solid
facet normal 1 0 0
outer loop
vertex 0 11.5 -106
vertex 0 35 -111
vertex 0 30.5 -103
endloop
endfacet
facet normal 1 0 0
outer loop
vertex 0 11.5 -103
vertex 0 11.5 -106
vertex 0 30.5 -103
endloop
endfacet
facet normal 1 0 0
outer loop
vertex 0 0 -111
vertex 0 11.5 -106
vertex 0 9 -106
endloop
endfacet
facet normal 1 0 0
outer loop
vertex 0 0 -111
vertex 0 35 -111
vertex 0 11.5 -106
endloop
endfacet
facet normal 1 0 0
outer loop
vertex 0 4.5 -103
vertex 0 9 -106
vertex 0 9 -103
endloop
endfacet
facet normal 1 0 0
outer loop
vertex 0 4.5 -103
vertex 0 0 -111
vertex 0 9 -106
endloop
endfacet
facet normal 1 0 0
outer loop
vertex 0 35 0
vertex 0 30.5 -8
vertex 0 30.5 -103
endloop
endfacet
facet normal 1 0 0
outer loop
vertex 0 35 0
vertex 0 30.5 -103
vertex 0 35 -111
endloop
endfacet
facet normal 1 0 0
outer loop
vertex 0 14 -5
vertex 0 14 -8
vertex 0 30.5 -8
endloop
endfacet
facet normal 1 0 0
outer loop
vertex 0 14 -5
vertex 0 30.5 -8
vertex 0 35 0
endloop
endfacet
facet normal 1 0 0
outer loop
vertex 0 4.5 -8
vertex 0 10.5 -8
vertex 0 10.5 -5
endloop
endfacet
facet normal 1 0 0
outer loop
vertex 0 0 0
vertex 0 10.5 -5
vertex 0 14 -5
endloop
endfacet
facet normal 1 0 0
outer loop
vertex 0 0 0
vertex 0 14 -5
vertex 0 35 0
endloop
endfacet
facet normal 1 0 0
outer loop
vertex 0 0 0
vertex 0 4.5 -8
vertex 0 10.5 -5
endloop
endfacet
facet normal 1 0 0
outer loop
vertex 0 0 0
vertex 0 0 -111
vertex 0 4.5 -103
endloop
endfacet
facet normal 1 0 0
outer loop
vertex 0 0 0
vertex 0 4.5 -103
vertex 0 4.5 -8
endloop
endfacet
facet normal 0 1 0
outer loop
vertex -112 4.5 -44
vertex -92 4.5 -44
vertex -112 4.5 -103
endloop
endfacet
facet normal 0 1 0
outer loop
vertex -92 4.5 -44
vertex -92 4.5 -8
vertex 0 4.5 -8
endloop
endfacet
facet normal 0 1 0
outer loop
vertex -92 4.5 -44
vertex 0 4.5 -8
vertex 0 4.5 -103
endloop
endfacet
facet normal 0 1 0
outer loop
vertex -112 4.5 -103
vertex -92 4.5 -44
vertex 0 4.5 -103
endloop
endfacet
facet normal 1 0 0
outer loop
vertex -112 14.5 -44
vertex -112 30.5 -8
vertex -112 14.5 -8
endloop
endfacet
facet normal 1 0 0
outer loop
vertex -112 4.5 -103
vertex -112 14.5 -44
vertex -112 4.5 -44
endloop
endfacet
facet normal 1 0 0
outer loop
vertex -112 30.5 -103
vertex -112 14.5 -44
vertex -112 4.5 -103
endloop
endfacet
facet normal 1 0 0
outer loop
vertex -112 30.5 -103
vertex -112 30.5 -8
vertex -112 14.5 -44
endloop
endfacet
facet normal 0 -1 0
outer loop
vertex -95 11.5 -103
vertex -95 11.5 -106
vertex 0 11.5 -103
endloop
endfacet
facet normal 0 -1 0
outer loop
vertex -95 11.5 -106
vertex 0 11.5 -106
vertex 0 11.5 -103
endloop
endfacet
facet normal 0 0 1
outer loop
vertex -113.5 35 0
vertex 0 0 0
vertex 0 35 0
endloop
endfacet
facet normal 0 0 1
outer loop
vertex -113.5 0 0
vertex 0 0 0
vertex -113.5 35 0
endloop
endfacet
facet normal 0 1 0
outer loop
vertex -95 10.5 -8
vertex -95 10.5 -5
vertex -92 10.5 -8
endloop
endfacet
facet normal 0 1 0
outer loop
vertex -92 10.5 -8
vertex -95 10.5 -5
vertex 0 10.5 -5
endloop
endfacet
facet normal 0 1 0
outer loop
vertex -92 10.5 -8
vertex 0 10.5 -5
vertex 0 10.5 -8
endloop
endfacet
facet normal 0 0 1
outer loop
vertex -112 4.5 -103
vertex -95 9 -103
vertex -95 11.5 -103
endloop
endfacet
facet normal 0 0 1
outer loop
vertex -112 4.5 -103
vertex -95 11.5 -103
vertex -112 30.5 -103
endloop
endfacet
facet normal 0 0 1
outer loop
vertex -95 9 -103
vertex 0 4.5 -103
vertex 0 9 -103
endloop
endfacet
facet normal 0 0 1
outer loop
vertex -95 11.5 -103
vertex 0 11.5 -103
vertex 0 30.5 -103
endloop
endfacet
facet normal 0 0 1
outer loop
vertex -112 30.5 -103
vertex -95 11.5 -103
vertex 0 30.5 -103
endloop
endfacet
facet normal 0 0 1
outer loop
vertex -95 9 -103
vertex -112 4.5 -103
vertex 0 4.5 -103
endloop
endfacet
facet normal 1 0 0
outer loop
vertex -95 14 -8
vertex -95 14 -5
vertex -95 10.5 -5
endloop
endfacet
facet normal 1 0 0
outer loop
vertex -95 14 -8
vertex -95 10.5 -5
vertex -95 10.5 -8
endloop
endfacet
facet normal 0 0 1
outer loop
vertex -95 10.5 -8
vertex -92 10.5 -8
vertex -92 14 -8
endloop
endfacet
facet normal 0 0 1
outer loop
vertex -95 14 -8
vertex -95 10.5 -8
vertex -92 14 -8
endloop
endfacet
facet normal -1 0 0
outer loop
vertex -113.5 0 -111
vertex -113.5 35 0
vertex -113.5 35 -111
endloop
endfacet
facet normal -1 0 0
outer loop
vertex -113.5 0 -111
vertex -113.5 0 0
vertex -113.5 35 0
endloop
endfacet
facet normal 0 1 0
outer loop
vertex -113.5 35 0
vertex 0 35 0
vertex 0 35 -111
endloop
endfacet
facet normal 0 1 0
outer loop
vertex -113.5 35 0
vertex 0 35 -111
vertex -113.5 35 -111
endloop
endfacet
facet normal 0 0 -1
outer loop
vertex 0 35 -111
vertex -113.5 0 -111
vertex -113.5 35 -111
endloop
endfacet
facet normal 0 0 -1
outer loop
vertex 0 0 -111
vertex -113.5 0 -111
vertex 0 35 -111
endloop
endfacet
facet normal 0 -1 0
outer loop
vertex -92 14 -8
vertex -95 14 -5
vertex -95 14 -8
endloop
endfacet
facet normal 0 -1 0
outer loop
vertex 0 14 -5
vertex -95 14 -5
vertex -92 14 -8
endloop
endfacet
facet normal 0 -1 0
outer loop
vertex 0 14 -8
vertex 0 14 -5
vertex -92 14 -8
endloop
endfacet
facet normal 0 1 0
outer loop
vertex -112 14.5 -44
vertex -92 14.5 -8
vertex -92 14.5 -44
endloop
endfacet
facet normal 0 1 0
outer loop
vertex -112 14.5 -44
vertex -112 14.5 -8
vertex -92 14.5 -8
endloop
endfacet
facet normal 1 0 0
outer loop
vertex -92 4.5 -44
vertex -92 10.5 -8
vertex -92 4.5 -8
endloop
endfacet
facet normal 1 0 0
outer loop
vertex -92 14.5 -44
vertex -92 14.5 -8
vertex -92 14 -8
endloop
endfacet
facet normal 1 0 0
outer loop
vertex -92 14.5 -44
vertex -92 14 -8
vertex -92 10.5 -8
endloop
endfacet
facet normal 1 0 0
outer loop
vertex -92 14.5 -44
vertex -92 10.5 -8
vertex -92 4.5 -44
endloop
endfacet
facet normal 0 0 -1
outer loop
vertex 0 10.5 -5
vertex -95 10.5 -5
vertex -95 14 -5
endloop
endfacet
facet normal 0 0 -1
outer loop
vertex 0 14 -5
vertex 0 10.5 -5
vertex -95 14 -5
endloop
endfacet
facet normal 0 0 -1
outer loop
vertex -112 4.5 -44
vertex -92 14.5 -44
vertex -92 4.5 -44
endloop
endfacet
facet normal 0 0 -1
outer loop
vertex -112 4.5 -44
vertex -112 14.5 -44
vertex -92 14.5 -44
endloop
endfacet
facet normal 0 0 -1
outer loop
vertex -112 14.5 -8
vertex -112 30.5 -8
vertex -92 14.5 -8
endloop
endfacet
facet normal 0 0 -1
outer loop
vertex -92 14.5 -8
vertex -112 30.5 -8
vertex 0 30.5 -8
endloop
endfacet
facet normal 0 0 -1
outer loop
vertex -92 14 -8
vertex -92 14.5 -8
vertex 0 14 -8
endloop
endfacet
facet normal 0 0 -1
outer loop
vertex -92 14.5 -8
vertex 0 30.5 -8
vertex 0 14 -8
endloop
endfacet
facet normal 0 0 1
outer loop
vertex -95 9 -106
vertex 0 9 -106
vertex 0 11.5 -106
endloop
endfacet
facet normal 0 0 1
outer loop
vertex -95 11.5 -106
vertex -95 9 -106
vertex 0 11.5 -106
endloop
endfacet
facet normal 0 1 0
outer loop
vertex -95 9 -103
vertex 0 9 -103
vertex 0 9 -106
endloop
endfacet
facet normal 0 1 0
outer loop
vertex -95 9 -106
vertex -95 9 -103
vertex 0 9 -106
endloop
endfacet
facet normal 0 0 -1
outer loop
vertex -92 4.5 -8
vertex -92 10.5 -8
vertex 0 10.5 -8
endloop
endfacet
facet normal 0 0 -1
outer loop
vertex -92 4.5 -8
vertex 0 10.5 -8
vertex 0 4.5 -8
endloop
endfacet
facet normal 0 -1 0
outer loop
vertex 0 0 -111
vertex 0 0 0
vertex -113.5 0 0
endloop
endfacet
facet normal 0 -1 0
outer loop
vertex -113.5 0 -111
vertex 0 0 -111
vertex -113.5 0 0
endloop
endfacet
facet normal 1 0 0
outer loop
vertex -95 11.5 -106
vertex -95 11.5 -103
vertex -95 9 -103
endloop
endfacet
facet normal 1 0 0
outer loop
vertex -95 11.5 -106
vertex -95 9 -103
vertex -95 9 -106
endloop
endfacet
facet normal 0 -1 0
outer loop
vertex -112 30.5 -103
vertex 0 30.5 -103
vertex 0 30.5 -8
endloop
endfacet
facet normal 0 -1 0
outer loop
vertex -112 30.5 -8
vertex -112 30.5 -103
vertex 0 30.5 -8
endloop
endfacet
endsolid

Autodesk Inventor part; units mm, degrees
ref_plane "YZ Plane" through (0, 0, 0) normal (1, 0, 0) x (0, 1, 0)
ref_plane "XZ Plane" through (0, 0, 0) normal (0, 1, 0) x (-1, 0, 0)
ref_plane "XY Plane" through (0, 0, 0) normal (0, 0, 1) x (1, 0, 0)
sketch "Sketch1" plane through (0, 0, 0) normal (0, 1, 0) x (-1, 0, 0)
  line L0 (0, 0) -> (113.5, 0)
  line L1 (113.5, 0) -> (113.5, -111)
  line L2 (113.5, -111) -> (0, -111)
  line L3 (0, -111) -> (0, 0)
  dimension "d0" = 113.5
  dimension "d1" = 111
extrude "Extrusion1" add sketch "Sketch1" along normal blind 35
sketch "Sketch2" plane through (0, 0, 0) normal (1, 0, 0) x (0, 0, -1)
  line L0 (0, 0) -> (0, 4.5)
  line L1 (0, 4.5) -> (8, 4.5)
  line L2 (8, 4.5) -> (103, 4.5)
  line L3 (103, 4.5) -> (103, 30.5)
  line L4 (103, 30.5) -> (8, 30.5)
  line L5 (8, 30.5) -> (8, 4.5)
  dimension "d4" = 4.5
  dimension "d5" = 8
  dimension "d6" = 95
  dimension "d7" = 26
extrude "Extrusion2" cut sketch "Sketch2" against normal blind 112
sketch "Sketch3" plane through (-112, 0, 0) normal (1, 0, 0) x (0, 0, -1)
  line L0 (8, 4.5) -> (8, 30.5) projected
  line L1 (8, 4.5) -> (44, 4.5)
  line L2 (103, 4.5) -> (8, 4.5) projected
  line L3 (8, 4.5) -> (8, 14.5)
  line L4 (8, 14.5) -> (44, 14.5)
  line L5 (44, 14.5) -> (44, 4.5)
  point P0 (0, 0)
  dimension "d10" = 36
  dimension "d11" = 10
extrude "Extrusion3" add sketch "Sketch3" along normal blind 20
sketch "Sketch4" plane through (0, 0, 0) normal (1, 0, 0) x (0, 0, -1)
  line L0 (0, 0) -> (0, 7)
  line L1 (0, 7) -> (5, 7)
  line L2 (5, 7) -> (5, 14)
  line L3 (5, 14) -> (8, 14)
  line L4 (8, 4.5) -> (8, 30.5) projected
  line L5 (5, 7) -> (8, 7)
  line L6 (8, 14) -> (8, 7)
  line L7 (111, 0) -> (111, 6.5)
  line L8 (111, 6.5) -> (106, 6.5)
  line L9 (106, 6.5) -> (106, 11.5)
  line L10 (103, 30.5) -> (103, 4.5) projected
  line L11 (106, 6.5) -> (103, 6.5)
  line L12 (106, 11.5) -> (103, 11.5)
  line L13 (103, 6.5) -> (103, 11.5)
  line L14 (103, 6.5) -> (103, 9)
  line L15 (103, 30.5) -> (103, 4.5) projected
  line L16 (103, 9) -> (106, 9)
  line L17 (8, 7) -> (8, 10.5)
  line L18 (5, 10.5) -> (8, 10.5)
  dimension "d14" = 7
  dimension "d15" = 5
  dimension "d16" = 7
  dimension "d17" = 6.5
  dimension "d18" = 5
  dimension "d19" = 5
extrude "Extrusion4" cut sketch "Sketch4" against normal blind 95 contours L2 L3 L4 L18 | L16 L10 L12 L9
properties part number "Plastic_Housing" material "Polyethylene, High Density"
